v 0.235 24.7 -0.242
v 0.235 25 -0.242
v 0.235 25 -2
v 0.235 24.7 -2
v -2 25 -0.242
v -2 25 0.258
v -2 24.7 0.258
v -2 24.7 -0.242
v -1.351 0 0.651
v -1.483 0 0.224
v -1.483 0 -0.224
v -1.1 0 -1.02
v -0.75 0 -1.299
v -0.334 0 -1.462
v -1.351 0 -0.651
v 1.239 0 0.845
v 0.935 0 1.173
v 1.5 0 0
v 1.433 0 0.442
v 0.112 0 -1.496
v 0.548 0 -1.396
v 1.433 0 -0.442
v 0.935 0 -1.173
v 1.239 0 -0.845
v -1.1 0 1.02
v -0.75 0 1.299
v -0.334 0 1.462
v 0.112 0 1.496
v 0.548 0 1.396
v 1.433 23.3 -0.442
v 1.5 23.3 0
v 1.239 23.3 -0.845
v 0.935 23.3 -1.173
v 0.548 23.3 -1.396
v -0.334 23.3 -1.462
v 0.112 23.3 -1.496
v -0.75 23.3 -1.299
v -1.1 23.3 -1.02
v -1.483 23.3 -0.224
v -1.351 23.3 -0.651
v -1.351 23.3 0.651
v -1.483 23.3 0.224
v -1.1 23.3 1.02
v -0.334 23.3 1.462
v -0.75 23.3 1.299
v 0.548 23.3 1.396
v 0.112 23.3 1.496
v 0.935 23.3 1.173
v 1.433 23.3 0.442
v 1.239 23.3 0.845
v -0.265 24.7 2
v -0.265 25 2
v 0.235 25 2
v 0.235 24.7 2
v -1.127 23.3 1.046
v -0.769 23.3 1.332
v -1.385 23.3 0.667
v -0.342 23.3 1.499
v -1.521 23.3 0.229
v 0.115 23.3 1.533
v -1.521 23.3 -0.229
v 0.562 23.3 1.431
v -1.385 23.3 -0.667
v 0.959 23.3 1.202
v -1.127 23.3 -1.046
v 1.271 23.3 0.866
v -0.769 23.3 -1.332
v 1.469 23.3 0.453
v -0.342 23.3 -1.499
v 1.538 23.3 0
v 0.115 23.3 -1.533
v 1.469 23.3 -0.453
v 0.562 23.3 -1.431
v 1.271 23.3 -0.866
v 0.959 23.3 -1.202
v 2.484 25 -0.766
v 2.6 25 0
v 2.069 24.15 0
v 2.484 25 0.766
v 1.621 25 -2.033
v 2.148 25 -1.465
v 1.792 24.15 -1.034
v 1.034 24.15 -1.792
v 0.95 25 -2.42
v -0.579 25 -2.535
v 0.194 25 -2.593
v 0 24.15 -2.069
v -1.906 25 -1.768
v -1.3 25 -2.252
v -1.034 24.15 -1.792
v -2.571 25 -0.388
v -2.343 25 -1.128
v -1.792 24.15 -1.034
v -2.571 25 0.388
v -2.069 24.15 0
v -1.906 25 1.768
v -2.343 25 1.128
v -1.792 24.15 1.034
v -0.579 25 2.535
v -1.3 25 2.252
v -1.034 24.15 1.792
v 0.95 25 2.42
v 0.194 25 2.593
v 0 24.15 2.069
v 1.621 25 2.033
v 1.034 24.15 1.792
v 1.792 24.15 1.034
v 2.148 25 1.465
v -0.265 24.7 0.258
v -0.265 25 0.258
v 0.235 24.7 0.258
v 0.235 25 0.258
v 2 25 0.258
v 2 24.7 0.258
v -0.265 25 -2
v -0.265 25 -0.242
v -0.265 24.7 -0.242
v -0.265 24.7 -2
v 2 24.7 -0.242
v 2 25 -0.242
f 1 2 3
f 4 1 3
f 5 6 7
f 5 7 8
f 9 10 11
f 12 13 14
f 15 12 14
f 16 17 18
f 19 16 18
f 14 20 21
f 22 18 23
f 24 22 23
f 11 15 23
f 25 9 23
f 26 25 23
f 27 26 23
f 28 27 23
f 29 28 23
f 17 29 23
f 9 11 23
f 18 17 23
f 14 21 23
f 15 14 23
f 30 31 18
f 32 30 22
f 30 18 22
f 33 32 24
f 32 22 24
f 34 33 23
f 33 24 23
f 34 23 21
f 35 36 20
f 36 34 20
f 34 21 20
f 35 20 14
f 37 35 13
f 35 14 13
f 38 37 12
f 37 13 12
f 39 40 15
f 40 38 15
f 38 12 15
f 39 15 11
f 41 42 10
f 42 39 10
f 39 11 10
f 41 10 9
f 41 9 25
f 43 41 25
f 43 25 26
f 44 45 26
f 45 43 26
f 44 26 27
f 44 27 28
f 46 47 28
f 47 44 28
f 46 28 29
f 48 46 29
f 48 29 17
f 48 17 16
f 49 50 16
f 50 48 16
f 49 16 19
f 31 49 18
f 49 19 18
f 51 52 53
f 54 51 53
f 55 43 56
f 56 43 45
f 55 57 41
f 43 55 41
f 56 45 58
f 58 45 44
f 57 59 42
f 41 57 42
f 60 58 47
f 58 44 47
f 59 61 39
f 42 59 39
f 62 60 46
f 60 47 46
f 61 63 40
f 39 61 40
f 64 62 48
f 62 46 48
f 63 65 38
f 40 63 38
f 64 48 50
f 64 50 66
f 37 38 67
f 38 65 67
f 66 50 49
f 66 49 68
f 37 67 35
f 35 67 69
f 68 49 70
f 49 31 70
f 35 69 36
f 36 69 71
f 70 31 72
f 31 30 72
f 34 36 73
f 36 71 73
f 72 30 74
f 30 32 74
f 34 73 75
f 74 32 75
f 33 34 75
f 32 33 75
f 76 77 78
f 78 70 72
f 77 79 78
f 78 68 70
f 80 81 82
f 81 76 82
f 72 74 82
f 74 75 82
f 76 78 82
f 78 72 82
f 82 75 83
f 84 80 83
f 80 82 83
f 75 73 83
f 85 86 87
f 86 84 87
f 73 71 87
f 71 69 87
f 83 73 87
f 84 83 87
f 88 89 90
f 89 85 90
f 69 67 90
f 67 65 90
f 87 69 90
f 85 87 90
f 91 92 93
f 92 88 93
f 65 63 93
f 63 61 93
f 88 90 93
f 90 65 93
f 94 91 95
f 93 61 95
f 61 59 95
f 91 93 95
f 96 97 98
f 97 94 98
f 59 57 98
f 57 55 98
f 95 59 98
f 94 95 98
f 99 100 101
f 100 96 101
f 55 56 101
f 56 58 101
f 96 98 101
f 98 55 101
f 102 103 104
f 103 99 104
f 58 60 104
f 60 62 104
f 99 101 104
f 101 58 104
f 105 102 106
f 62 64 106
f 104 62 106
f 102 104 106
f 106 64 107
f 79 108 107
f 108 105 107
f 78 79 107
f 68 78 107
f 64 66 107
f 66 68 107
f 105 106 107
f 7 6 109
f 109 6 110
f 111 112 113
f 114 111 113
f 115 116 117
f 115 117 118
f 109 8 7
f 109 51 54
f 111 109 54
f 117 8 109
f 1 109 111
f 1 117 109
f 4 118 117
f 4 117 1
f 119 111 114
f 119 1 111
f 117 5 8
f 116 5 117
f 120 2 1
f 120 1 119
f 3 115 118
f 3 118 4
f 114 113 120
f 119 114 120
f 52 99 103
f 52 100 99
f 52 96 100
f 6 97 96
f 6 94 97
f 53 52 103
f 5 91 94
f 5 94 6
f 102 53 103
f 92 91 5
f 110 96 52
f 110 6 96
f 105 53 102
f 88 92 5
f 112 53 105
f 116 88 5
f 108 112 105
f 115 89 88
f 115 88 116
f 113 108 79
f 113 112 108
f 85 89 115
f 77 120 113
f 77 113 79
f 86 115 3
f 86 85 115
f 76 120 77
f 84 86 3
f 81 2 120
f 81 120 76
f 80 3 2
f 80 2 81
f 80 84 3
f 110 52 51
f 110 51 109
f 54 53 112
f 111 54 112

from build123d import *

# Parameters (mm, degrees)
SKETCH1_R           = 1.5
BOSS_EXTRUDE1_DEPTH = 25
SKETCH2_R           = 2.6
BOSS_EXTRUDE2_DEPTH = 1.7
BOSS_EXTRUDE2_TAPER = 32
SKETCH3_W           = 0.5
SKETCH3_H           = 1.758378485
SKETCH3_H_2         = 1.741621515
SKETCH3_W_2         = 1.734727157
SKETCH3_H_3         = 0.5
SKETCH3_W_3         = 1.765272843
CUT_EXTRUDE1_DEPTH  = 0.3


with BuildPart() as part:
    # Sketch1 → Boss-Extrude1 (new body)
    with BuildSketch(Plane(origin=(0, 0, 0), x_dir=(1, 0, 0), z_dir=(0, 1, 0))):
        Circle(SKETCH1_R)
    extrude(amount=BOSS_EXTRUDE1_DEPTH)

    # Sketch2 → Boss-Extrude2 (add)
    with BuildSketch(Plane(origin=(0, 25, 0), x_dir=(1, 0, 0), z_dir=(0, 1, 0))):
        Circle(SKETCH2_R)
    extrude(amount=-BOSS_EXTRUDE2_DEPTH, taper=BOSS_EXTRUDE2_TAPER)

    # Sketch3 → Cut-Extrude1 (cut)
    with BuildSketch(Plane(origin=(0, 25, 0), x_dir=(1, 0, 0), z_dir=(0, 1, 0))):
        with Locations((-0.015272843, 1.120810757)):
            Rectangle(SKETCH3_W, SKETCH3_H)
        with Locations((-0.015272843, -1.129189243)):
            Rectangle(SKETCH3_W, SKETCH3_H_2)
        with Locations((-1.132636421, -0.008378485)):
            Rectangle(SKETCH3_W_2, SKETCH3_H_3)
        with Locations((1.117363579, -0.008378485)):
            Rectangle(SKETCH3_W_3, SKETCH3_H_3)
        with Locations((-0.015272843, -0.008378485)):
            Rectangle(SKETCH3_W, SKETCH3_H_3)
    extrude(amount=-CUT_EXTRUDE1_DEPTH, mode=Mode.SUBTRACT)


solid = part.part
